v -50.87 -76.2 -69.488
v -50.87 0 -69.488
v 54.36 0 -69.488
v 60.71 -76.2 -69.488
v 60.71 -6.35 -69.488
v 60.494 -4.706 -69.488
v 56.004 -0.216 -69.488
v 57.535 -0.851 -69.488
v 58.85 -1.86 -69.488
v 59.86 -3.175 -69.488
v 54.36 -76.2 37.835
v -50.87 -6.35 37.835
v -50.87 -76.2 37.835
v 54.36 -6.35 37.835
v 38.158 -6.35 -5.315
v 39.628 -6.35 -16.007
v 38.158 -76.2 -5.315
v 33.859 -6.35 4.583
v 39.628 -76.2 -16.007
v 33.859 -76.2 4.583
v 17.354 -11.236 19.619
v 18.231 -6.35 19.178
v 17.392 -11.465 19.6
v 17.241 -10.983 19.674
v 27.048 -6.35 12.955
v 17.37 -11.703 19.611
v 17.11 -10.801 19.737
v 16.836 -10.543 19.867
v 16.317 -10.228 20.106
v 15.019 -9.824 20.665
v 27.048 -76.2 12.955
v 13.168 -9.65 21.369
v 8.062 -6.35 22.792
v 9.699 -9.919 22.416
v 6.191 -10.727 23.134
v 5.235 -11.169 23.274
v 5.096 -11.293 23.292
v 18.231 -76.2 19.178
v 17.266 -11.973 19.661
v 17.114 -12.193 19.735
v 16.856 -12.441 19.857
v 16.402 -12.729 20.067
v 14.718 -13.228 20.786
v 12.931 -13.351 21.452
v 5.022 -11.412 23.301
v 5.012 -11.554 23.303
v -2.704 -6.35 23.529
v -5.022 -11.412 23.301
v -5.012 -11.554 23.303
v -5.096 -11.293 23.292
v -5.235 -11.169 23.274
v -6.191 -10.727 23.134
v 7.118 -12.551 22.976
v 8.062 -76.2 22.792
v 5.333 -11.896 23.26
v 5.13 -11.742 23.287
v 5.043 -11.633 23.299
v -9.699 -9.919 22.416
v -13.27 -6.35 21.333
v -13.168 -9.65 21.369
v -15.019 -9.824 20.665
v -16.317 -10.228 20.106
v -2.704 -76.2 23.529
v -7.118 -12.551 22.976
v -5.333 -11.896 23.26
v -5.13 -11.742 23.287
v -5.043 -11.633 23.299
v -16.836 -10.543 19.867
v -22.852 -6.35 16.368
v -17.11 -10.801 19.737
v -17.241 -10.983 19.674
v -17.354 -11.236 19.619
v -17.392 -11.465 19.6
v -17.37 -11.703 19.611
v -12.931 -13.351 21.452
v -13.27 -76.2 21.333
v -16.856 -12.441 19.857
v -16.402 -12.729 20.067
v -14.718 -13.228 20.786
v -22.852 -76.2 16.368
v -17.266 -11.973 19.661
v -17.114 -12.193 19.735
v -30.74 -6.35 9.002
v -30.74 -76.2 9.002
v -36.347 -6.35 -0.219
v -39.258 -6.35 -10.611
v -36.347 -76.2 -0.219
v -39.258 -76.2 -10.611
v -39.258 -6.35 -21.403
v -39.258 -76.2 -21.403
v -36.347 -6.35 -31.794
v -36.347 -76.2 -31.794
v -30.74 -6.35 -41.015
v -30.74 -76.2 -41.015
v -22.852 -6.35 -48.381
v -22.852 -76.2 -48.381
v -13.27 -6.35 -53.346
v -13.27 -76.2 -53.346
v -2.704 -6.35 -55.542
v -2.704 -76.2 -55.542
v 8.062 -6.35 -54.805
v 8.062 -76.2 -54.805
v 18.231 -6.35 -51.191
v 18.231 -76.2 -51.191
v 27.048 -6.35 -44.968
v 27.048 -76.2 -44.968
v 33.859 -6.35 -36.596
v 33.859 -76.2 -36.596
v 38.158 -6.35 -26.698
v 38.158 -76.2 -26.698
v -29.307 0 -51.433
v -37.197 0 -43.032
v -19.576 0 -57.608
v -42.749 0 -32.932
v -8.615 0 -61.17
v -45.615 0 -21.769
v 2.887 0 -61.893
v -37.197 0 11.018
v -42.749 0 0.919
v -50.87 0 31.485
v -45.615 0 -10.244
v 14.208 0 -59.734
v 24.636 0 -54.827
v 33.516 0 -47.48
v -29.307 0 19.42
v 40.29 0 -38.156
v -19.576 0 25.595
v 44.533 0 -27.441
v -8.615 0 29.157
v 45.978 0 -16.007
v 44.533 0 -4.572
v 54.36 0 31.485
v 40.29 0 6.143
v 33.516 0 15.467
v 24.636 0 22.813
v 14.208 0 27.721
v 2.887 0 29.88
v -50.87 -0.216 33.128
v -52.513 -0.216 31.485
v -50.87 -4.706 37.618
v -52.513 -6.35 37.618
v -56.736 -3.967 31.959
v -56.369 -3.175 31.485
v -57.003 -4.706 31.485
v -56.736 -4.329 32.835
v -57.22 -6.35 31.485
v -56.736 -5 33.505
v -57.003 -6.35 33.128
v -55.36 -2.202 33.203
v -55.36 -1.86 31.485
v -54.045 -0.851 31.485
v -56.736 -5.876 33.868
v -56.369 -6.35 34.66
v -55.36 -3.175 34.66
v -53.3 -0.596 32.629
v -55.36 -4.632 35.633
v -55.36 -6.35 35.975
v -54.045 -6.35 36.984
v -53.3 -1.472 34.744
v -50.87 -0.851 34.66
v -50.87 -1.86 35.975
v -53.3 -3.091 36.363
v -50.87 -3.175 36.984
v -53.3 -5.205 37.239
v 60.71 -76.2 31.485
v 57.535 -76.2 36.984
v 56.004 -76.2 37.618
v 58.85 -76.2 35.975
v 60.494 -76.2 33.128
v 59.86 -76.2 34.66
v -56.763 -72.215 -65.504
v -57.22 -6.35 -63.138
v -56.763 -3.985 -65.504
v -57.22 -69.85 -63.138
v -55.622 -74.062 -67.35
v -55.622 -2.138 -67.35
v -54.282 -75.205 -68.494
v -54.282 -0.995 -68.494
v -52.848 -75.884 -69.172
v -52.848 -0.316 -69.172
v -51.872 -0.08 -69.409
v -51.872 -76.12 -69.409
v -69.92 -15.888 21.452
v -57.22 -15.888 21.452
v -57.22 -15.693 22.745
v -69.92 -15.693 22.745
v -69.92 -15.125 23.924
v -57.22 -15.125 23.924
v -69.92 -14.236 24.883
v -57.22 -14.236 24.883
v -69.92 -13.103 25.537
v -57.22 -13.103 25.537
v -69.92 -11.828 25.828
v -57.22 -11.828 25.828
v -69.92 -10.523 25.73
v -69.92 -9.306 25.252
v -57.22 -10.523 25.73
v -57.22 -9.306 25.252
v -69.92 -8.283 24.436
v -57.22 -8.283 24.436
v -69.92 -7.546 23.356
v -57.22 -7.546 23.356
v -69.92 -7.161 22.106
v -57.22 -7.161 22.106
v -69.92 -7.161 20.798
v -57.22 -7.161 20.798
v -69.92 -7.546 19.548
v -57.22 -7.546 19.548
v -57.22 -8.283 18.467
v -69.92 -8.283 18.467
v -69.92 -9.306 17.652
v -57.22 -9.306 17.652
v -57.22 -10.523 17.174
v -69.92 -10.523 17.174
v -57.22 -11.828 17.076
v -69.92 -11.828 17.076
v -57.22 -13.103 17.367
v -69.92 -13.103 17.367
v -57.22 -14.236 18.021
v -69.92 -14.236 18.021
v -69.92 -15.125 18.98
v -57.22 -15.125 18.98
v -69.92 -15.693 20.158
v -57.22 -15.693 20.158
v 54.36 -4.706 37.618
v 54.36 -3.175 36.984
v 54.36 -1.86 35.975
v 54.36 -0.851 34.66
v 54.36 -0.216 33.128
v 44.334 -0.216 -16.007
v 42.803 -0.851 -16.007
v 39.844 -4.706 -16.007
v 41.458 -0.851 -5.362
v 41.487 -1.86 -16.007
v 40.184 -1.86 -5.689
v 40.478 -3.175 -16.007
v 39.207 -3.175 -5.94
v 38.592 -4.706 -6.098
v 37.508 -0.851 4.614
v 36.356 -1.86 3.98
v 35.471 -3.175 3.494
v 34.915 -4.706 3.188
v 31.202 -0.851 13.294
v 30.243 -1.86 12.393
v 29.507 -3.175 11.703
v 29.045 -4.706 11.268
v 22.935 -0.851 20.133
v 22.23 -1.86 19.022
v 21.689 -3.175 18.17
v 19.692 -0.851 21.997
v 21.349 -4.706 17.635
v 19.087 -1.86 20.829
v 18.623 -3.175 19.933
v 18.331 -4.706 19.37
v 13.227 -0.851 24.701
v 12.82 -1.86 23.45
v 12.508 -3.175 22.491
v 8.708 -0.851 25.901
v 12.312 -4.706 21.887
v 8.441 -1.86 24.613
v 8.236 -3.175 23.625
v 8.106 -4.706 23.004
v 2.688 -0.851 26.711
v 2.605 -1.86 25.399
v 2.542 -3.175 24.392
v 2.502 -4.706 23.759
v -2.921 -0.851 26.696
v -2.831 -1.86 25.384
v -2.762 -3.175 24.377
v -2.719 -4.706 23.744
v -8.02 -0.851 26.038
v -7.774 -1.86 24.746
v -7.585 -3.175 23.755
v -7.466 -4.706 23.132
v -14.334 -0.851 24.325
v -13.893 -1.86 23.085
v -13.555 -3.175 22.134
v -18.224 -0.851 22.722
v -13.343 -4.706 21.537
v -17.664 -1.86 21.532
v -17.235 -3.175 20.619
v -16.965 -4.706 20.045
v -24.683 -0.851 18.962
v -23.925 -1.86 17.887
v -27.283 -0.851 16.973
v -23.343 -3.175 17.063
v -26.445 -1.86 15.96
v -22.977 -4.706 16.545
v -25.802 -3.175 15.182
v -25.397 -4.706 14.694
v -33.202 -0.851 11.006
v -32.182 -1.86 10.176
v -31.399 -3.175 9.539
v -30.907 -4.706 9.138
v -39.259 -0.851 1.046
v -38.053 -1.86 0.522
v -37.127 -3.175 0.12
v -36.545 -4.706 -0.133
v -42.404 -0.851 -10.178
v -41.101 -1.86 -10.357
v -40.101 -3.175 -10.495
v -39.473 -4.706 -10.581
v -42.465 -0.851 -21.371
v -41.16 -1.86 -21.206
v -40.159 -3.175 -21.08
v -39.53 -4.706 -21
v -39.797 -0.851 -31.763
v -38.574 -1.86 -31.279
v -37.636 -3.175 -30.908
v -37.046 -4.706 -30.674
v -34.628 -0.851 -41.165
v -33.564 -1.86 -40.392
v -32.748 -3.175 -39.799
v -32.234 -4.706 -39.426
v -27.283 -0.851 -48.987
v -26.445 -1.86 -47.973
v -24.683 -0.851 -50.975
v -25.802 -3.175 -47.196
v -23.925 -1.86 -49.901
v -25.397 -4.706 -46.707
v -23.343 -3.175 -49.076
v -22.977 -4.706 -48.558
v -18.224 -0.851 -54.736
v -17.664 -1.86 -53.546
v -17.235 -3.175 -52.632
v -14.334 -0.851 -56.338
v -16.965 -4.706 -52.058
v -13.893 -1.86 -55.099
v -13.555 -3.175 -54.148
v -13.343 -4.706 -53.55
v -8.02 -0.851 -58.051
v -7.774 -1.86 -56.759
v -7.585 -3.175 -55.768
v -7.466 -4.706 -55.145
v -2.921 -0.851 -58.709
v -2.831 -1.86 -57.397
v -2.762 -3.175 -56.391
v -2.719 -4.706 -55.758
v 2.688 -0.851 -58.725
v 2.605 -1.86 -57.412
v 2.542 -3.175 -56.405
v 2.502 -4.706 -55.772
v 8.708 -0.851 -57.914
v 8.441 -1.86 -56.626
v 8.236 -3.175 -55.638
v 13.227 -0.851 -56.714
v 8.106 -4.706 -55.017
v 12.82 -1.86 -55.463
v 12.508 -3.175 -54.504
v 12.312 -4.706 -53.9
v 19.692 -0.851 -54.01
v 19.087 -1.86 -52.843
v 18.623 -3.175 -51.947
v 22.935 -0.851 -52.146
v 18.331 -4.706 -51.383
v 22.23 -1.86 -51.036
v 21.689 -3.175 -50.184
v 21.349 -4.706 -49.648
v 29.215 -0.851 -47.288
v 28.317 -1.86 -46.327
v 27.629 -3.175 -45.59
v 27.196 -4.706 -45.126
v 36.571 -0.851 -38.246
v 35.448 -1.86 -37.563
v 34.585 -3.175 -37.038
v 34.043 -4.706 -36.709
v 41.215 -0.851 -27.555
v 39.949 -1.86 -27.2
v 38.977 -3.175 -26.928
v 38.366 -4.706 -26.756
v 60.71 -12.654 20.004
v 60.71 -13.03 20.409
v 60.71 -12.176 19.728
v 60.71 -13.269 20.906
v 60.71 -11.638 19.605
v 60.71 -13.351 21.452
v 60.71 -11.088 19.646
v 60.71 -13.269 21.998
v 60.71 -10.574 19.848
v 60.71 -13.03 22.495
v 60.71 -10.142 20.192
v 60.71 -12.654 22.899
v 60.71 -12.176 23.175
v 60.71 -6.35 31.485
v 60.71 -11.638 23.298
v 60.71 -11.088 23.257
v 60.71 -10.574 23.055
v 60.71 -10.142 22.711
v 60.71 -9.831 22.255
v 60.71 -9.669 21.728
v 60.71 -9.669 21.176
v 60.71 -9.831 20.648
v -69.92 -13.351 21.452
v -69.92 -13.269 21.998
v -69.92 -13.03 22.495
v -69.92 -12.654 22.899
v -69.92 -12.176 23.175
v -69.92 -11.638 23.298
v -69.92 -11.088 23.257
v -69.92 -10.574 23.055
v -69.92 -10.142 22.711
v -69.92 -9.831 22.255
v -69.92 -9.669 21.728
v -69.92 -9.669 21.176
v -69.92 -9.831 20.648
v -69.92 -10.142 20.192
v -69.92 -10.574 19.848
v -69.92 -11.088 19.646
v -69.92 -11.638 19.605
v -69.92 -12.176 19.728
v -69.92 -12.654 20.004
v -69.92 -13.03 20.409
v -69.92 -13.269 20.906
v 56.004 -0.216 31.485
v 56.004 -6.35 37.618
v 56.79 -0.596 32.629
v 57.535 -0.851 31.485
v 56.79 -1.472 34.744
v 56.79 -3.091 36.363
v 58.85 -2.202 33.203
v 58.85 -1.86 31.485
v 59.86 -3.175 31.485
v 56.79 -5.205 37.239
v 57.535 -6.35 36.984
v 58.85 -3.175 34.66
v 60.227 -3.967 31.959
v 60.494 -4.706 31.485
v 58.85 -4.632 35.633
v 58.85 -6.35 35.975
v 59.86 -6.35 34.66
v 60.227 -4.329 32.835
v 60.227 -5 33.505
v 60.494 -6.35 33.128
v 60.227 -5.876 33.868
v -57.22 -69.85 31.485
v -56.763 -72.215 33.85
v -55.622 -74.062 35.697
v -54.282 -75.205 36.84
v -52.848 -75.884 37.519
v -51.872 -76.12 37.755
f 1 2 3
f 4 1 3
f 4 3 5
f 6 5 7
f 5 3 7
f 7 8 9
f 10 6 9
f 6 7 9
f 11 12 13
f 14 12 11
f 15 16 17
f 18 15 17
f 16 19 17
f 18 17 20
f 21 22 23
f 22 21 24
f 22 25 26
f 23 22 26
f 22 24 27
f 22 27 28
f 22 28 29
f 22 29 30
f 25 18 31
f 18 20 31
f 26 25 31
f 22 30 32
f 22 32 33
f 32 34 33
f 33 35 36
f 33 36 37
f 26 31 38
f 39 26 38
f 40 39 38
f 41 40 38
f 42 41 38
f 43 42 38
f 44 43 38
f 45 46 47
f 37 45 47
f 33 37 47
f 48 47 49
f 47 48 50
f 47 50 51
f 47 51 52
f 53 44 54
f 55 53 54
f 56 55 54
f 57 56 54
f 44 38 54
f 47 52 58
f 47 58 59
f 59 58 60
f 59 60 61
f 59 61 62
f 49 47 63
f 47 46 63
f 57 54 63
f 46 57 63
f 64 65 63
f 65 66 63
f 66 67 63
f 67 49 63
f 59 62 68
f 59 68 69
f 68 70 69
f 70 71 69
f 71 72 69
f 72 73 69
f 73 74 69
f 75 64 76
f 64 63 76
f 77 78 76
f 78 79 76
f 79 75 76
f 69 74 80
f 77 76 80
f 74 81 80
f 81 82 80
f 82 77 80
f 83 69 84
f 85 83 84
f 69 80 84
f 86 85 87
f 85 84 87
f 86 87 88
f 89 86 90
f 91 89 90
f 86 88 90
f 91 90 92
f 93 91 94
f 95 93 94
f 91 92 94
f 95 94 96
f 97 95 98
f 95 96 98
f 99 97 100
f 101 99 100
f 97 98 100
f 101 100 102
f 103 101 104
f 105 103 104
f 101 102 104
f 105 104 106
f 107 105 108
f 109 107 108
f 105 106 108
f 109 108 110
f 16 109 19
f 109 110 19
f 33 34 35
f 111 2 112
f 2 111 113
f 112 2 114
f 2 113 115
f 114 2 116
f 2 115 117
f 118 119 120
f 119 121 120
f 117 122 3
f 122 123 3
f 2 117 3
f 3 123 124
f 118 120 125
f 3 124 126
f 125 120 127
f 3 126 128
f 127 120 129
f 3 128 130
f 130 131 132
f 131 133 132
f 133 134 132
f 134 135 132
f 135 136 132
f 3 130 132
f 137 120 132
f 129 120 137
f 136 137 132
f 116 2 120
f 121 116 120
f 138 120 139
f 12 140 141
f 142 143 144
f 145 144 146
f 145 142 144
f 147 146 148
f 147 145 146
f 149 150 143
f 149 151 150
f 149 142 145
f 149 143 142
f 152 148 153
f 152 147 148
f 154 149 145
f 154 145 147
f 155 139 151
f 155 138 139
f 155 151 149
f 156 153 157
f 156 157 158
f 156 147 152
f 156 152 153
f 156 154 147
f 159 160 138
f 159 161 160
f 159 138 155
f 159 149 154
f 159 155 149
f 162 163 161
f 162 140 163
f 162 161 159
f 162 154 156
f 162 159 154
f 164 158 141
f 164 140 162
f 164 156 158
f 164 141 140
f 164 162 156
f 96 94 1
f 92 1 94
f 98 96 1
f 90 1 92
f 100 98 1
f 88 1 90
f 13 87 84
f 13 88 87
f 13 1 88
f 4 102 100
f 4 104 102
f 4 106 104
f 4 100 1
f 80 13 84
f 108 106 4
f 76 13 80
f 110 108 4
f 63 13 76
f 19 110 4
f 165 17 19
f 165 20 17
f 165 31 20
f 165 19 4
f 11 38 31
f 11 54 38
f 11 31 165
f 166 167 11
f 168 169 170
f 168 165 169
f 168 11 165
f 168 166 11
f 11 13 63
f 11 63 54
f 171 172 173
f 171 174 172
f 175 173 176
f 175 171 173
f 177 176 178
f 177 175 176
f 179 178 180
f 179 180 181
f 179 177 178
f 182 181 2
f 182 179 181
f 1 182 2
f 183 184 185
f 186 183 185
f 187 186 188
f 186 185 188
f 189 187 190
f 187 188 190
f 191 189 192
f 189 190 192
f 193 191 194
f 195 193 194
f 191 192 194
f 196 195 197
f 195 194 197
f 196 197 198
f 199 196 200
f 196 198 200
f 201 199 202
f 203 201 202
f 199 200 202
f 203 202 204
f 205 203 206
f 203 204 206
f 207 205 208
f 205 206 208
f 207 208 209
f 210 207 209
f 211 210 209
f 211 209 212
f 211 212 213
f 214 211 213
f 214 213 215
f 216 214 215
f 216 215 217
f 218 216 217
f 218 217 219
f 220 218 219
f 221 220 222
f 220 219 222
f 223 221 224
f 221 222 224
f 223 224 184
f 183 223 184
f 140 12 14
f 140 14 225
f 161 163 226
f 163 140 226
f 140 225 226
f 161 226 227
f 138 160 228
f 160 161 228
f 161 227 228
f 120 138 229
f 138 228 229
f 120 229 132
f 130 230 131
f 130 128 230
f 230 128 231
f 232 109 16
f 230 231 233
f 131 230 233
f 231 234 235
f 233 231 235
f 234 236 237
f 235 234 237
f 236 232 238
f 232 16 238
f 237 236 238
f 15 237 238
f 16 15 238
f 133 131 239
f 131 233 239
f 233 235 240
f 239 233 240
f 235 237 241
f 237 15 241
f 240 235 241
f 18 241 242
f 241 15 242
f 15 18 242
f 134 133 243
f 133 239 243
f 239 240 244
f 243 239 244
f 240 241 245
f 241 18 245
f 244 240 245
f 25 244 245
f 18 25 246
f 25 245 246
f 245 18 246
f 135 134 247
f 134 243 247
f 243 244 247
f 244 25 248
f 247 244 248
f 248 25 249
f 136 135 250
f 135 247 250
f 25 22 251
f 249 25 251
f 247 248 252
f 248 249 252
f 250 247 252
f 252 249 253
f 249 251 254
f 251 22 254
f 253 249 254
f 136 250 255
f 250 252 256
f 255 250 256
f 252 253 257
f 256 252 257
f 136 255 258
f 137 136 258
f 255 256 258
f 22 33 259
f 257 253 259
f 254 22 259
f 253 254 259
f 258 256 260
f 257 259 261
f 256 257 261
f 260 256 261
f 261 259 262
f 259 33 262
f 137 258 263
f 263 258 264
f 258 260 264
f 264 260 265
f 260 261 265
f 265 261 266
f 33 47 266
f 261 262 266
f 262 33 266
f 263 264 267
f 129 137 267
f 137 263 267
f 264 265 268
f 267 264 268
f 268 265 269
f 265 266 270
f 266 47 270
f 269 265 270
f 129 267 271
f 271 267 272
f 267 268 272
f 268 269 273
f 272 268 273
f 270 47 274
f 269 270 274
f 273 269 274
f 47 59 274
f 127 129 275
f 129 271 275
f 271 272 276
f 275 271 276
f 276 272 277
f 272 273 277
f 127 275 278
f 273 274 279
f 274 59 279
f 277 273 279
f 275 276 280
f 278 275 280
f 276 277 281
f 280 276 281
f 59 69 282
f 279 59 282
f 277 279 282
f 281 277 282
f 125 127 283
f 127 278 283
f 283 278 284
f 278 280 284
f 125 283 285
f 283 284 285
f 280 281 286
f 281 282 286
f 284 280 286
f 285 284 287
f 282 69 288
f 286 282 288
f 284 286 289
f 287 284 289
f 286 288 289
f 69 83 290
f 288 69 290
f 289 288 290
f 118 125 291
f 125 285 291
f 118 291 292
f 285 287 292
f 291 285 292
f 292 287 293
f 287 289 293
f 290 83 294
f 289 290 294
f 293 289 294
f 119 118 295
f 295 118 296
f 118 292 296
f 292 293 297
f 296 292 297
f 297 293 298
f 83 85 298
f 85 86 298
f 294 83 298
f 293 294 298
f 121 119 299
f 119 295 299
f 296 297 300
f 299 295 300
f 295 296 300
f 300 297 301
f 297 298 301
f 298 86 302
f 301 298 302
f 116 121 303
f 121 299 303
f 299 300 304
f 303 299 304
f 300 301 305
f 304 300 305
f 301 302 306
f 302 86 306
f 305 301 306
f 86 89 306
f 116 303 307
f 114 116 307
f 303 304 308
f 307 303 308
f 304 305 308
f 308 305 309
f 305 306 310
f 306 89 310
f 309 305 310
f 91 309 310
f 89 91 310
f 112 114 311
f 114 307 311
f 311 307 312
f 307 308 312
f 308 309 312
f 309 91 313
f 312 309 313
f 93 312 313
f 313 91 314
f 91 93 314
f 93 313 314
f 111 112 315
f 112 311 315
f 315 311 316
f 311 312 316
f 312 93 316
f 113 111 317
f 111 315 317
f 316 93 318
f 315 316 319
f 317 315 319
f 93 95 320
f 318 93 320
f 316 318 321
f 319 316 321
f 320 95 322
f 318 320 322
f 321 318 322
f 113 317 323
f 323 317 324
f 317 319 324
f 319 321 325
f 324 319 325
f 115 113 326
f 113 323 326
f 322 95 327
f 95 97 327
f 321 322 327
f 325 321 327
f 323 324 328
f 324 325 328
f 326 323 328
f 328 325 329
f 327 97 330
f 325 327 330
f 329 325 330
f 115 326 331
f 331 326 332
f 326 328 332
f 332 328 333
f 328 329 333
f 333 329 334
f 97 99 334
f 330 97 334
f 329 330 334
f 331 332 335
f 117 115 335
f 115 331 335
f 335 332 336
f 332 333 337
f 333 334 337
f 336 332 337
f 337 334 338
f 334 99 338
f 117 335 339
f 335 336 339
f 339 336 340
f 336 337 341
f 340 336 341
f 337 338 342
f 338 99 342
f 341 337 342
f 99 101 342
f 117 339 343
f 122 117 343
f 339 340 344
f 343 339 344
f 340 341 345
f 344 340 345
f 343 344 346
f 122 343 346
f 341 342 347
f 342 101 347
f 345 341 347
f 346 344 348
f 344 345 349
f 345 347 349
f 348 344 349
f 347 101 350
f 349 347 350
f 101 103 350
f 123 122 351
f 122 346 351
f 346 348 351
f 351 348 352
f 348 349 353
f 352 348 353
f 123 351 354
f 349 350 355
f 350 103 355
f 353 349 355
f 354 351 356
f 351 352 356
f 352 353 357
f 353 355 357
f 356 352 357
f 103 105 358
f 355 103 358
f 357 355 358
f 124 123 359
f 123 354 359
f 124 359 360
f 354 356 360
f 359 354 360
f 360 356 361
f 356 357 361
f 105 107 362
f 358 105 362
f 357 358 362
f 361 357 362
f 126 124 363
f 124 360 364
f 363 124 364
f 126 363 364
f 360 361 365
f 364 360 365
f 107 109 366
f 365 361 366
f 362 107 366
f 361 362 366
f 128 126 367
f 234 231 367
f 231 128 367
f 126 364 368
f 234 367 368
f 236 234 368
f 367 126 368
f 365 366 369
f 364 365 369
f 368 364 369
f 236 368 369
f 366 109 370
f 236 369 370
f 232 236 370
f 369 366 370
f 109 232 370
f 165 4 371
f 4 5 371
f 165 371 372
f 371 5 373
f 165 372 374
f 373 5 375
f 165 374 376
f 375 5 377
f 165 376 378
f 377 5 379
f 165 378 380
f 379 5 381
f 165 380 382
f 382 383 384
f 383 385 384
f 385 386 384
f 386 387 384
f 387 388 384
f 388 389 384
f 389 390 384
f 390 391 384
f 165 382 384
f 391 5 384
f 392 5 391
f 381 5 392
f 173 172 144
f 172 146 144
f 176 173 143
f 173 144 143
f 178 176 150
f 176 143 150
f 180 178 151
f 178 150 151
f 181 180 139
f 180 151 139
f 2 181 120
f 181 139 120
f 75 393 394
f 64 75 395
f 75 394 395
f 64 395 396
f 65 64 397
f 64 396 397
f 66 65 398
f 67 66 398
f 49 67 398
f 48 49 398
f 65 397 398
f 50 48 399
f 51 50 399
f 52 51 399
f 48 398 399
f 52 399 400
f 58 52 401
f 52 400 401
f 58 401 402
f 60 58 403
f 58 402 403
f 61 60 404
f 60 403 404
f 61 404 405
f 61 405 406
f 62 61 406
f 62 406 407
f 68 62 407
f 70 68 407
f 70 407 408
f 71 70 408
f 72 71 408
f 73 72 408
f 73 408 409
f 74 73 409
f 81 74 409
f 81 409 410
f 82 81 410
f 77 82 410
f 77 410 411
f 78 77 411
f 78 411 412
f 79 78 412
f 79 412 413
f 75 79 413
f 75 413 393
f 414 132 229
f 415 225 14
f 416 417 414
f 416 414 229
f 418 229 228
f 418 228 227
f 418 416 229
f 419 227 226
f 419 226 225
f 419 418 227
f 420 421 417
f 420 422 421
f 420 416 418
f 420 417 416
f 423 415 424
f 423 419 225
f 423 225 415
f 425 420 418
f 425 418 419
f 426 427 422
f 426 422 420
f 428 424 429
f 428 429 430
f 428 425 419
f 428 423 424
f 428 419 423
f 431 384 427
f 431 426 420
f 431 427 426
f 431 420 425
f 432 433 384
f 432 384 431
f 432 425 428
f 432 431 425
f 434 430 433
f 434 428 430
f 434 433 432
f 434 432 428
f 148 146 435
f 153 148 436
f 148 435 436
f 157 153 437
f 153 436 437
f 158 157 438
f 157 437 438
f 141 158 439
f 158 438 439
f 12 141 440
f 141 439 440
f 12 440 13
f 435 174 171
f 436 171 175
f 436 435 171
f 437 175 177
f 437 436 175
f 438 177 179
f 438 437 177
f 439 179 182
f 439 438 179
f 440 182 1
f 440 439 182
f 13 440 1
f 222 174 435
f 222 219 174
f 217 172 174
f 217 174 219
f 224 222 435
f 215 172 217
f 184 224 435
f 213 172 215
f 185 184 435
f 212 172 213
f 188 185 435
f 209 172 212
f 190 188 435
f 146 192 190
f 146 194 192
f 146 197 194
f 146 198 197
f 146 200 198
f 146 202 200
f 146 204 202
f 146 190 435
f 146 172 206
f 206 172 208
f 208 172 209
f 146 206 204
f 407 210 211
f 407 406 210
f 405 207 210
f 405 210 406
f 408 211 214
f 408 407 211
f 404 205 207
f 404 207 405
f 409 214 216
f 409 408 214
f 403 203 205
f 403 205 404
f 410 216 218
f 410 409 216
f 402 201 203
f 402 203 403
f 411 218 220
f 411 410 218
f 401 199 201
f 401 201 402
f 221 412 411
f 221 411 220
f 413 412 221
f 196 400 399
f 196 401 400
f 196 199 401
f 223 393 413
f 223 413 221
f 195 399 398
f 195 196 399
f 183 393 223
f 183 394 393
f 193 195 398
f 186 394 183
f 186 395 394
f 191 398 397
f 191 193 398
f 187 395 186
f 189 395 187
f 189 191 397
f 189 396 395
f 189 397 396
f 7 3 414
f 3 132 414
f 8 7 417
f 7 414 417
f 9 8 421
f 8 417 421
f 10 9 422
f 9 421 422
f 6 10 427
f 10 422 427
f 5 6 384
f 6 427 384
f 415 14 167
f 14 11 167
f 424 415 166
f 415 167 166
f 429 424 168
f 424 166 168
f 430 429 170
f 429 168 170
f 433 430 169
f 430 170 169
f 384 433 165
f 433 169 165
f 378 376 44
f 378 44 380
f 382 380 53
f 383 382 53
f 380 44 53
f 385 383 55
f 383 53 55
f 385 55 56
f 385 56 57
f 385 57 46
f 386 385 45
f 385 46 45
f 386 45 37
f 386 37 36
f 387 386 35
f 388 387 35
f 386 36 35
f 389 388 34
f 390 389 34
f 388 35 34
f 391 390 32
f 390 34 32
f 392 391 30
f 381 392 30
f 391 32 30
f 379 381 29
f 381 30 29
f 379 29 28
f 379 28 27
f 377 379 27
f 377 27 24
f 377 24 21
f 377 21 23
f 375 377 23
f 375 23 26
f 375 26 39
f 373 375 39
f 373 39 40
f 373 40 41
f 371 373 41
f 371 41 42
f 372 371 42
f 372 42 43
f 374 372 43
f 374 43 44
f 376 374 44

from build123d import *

# Parameters (mm, degrees)
F0_W     = 117.930185
F0_H     = 107.323121
F1_DEPTH = 76.2
F2_R     = 39.627537
F3_DEPTH = 76.2
F4_R     = 6.35
F5_R     = 6.35
F6_R     = 4.388135
F7_DEPTH = 12.7
F8_R     = 1.851713
F9_DEPTH = 152.4


with BuildPart() as f1:
    # F0 (on Front) → F1 (new body)
    with BuildSketch(Plane.XZ):
        with Locations((1.745266, -15.826897)):
            Rectangle(F0_W, F0_H)
    extrude(amount=F1_DEPTH)

    # F2 (on face) → F3 (cut)
    with BuildSketch(Plane.XZ.offset(76.2)):
        with Locations((0, -16.006619)):
            Circle(F2_R)
    extrude(amount=-F3_DEPTH, mode=Mode.SUBTRACT)

    # F4
    f4_edges = [f1.edges().sort_by_distance(p)[0] for p in [
        (1.745267, 0, 37.834663),
        (-39.627537, 0, -16.006619),
    ]]
    fillet(f4_edges, radius=F4_R)

    # F5
    f5_edges = [f1.edges().sort_by_distance(p)[0] for p in [
        (60.710359, 0, -19.001898),
        (-57.219826, -41.275, 37.834663),
        (-57.219826, -1.859872, 35.974791),
        (-57.219826, -76.2, -15.826898),
        (-57.219826, 0, -19.001898),
        (-57.219826, -38.1, -69.488458),
    ]]
    fillet(f5_edges, radius=F5_R)

    # F6 (on face) → F7 (join)
    with BuildSketch(Plane(origin=(-57.219826, 0, 0), x_dir=(0, -1, 0), z_dir=(-1, 0, 0))):
        with Locations((11.499761, 21.451753)):
            Circle(F6_R)
    extrude(amount=F7_DEPTH)

    # F8 (on face) → F9 (cut)
    with BuildSketch(Plane(origin=(-69.919826, 0, 0), x_dir=(0, -1, 0), z_dir=(-1, 0, 0))):
        with Locations((11.499761, 21.451753)):
            Circle(F8_R)
    extrude(amount=-F9_DEPTH, mode=Mode.SUBTRACT)


solid = f1.part
